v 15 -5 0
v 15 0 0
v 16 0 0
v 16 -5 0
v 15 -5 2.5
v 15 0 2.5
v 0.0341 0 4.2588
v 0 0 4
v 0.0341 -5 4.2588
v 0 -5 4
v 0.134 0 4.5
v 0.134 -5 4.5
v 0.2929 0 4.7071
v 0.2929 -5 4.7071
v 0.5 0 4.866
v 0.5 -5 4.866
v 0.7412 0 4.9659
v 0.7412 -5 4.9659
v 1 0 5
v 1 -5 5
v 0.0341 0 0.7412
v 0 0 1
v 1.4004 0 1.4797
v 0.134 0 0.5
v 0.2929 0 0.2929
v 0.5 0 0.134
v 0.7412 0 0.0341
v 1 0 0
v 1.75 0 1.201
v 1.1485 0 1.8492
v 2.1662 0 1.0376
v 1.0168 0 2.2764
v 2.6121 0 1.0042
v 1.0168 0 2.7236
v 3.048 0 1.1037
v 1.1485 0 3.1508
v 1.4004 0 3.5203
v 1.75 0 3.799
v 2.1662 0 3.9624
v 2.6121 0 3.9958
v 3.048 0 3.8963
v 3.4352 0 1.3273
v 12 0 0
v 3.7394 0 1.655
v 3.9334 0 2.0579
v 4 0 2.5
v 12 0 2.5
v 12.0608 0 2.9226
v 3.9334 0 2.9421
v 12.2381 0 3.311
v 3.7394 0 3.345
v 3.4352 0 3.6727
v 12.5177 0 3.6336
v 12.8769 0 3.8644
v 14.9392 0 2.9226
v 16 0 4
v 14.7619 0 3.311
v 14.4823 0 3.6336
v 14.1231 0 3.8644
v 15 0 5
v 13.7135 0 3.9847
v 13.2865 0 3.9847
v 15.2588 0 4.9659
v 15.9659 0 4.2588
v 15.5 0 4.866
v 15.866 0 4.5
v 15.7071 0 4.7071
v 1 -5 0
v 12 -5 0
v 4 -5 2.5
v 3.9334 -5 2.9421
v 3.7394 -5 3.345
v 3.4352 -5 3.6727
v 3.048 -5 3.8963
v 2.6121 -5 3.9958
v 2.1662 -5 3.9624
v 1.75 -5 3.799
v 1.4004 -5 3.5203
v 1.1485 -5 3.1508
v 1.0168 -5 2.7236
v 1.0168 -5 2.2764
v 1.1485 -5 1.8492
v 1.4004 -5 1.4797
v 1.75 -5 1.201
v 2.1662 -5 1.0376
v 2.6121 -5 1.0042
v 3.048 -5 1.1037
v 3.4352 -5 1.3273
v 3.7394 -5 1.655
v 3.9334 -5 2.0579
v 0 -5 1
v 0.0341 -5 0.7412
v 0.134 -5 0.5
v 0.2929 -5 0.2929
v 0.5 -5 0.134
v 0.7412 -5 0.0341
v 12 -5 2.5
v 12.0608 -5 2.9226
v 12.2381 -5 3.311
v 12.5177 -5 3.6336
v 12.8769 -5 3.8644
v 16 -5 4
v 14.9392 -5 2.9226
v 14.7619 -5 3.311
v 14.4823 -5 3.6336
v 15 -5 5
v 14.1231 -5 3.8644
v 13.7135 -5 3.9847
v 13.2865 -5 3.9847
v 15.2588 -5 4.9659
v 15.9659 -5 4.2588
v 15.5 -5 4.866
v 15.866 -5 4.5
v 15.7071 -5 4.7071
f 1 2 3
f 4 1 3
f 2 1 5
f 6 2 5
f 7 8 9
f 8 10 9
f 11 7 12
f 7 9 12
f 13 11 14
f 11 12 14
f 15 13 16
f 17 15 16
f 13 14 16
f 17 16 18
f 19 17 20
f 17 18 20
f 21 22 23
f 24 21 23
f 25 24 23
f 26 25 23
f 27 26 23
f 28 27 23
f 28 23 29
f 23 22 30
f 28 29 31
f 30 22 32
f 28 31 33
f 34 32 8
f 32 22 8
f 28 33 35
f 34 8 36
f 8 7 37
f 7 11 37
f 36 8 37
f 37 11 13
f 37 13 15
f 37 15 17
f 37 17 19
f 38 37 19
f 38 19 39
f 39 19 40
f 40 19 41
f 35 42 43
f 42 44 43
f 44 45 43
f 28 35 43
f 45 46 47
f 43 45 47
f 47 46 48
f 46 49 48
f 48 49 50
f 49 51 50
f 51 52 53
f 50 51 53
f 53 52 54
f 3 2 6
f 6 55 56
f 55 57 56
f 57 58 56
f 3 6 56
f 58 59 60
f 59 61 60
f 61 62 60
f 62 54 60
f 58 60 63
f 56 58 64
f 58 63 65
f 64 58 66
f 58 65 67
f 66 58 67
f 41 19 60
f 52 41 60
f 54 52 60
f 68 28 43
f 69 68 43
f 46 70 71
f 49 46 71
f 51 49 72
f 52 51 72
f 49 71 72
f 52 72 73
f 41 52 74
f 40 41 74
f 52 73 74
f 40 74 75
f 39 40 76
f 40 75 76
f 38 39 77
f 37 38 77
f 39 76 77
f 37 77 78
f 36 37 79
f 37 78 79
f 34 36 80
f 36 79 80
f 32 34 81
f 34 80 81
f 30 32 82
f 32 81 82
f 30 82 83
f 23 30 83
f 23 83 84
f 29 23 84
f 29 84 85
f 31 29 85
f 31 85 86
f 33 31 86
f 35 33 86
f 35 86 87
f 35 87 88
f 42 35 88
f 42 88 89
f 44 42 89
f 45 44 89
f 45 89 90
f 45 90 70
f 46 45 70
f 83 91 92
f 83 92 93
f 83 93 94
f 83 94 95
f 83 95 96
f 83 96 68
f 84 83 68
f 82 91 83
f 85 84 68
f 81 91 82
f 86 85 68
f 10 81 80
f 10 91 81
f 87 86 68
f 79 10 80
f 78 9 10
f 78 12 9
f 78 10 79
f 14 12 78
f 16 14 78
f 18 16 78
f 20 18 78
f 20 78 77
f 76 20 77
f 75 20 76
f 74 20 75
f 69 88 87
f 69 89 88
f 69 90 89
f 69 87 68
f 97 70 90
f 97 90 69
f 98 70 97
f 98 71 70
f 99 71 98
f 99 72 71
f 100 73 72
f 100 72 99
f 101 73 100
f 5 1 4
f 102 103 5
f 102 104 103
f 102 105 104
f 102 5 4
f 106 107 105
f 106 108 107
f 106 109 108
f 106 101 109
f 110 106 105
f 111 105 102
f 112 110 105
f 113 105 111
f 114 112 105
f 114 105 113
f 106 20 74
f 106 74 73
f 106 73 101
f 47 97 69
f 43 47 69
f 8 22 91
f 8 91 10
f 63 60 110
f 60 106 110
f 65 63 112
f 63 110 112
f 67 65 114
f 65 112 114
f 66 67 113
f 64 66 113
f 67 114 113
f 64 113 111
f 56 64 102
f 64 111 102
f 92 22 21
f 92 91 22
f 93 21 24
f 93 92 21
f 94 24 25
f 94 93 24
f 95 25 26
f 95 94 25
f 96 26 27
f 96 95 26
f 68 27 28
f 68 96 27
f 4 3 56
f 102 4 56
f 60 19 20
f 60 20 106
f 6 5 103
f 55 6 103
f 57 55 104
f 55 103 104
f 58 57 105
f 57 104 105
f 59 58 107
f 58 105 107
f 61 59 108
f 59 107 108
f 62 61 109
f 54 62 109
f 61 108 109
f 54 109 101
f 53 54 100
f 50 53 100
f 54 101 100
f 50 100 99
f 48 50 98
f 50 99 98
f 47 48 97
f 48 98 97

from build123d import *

# Parameters (mm, degrees)
F0_W     = 16
F0_H     = 5
F1_DEPTH = 5
F2_R     = 1.5
F3_DEPTH = 5.001
F4_R     = 1


with BuildPart() as f1:
    # F0 (on Front) → F1 (new body)
    with BuildSketch(Plane.XZ):
        with Locations((8, 2.5)):
            Rectangle(F0_W, F0_H)
    extrude(amount=F1_DEPTH)

    # F2 (on face) → F3 (cut, through all)
    with BuildSketch(Plane.XZ.offset(5)):
        with Locations((2.5, 2.5)):
            Circle(F2_R)
        with BuildLine():
            Line((15, 0), (15, 2.5))
            ThreePointArc((15, 2.5), (13.5, 4), (12, 2.5))
            Line((12, 2.5), (12, 0))
            Line((12, 0), (15, 0))
        make_face()
    extrude(amount=-F3_DEPTH, mode=Mode.SUBTRACT)

    # F4
    f4_edges = [f1.edges().sort_by_distance(p)[0] for p in [
        (0, -2.5, 0),
        (0, -2.5, 5),
        (16, -2.5, 5),
    ]]
    fillet(f4_edges, radius=F4_R)


solid = f1.part
